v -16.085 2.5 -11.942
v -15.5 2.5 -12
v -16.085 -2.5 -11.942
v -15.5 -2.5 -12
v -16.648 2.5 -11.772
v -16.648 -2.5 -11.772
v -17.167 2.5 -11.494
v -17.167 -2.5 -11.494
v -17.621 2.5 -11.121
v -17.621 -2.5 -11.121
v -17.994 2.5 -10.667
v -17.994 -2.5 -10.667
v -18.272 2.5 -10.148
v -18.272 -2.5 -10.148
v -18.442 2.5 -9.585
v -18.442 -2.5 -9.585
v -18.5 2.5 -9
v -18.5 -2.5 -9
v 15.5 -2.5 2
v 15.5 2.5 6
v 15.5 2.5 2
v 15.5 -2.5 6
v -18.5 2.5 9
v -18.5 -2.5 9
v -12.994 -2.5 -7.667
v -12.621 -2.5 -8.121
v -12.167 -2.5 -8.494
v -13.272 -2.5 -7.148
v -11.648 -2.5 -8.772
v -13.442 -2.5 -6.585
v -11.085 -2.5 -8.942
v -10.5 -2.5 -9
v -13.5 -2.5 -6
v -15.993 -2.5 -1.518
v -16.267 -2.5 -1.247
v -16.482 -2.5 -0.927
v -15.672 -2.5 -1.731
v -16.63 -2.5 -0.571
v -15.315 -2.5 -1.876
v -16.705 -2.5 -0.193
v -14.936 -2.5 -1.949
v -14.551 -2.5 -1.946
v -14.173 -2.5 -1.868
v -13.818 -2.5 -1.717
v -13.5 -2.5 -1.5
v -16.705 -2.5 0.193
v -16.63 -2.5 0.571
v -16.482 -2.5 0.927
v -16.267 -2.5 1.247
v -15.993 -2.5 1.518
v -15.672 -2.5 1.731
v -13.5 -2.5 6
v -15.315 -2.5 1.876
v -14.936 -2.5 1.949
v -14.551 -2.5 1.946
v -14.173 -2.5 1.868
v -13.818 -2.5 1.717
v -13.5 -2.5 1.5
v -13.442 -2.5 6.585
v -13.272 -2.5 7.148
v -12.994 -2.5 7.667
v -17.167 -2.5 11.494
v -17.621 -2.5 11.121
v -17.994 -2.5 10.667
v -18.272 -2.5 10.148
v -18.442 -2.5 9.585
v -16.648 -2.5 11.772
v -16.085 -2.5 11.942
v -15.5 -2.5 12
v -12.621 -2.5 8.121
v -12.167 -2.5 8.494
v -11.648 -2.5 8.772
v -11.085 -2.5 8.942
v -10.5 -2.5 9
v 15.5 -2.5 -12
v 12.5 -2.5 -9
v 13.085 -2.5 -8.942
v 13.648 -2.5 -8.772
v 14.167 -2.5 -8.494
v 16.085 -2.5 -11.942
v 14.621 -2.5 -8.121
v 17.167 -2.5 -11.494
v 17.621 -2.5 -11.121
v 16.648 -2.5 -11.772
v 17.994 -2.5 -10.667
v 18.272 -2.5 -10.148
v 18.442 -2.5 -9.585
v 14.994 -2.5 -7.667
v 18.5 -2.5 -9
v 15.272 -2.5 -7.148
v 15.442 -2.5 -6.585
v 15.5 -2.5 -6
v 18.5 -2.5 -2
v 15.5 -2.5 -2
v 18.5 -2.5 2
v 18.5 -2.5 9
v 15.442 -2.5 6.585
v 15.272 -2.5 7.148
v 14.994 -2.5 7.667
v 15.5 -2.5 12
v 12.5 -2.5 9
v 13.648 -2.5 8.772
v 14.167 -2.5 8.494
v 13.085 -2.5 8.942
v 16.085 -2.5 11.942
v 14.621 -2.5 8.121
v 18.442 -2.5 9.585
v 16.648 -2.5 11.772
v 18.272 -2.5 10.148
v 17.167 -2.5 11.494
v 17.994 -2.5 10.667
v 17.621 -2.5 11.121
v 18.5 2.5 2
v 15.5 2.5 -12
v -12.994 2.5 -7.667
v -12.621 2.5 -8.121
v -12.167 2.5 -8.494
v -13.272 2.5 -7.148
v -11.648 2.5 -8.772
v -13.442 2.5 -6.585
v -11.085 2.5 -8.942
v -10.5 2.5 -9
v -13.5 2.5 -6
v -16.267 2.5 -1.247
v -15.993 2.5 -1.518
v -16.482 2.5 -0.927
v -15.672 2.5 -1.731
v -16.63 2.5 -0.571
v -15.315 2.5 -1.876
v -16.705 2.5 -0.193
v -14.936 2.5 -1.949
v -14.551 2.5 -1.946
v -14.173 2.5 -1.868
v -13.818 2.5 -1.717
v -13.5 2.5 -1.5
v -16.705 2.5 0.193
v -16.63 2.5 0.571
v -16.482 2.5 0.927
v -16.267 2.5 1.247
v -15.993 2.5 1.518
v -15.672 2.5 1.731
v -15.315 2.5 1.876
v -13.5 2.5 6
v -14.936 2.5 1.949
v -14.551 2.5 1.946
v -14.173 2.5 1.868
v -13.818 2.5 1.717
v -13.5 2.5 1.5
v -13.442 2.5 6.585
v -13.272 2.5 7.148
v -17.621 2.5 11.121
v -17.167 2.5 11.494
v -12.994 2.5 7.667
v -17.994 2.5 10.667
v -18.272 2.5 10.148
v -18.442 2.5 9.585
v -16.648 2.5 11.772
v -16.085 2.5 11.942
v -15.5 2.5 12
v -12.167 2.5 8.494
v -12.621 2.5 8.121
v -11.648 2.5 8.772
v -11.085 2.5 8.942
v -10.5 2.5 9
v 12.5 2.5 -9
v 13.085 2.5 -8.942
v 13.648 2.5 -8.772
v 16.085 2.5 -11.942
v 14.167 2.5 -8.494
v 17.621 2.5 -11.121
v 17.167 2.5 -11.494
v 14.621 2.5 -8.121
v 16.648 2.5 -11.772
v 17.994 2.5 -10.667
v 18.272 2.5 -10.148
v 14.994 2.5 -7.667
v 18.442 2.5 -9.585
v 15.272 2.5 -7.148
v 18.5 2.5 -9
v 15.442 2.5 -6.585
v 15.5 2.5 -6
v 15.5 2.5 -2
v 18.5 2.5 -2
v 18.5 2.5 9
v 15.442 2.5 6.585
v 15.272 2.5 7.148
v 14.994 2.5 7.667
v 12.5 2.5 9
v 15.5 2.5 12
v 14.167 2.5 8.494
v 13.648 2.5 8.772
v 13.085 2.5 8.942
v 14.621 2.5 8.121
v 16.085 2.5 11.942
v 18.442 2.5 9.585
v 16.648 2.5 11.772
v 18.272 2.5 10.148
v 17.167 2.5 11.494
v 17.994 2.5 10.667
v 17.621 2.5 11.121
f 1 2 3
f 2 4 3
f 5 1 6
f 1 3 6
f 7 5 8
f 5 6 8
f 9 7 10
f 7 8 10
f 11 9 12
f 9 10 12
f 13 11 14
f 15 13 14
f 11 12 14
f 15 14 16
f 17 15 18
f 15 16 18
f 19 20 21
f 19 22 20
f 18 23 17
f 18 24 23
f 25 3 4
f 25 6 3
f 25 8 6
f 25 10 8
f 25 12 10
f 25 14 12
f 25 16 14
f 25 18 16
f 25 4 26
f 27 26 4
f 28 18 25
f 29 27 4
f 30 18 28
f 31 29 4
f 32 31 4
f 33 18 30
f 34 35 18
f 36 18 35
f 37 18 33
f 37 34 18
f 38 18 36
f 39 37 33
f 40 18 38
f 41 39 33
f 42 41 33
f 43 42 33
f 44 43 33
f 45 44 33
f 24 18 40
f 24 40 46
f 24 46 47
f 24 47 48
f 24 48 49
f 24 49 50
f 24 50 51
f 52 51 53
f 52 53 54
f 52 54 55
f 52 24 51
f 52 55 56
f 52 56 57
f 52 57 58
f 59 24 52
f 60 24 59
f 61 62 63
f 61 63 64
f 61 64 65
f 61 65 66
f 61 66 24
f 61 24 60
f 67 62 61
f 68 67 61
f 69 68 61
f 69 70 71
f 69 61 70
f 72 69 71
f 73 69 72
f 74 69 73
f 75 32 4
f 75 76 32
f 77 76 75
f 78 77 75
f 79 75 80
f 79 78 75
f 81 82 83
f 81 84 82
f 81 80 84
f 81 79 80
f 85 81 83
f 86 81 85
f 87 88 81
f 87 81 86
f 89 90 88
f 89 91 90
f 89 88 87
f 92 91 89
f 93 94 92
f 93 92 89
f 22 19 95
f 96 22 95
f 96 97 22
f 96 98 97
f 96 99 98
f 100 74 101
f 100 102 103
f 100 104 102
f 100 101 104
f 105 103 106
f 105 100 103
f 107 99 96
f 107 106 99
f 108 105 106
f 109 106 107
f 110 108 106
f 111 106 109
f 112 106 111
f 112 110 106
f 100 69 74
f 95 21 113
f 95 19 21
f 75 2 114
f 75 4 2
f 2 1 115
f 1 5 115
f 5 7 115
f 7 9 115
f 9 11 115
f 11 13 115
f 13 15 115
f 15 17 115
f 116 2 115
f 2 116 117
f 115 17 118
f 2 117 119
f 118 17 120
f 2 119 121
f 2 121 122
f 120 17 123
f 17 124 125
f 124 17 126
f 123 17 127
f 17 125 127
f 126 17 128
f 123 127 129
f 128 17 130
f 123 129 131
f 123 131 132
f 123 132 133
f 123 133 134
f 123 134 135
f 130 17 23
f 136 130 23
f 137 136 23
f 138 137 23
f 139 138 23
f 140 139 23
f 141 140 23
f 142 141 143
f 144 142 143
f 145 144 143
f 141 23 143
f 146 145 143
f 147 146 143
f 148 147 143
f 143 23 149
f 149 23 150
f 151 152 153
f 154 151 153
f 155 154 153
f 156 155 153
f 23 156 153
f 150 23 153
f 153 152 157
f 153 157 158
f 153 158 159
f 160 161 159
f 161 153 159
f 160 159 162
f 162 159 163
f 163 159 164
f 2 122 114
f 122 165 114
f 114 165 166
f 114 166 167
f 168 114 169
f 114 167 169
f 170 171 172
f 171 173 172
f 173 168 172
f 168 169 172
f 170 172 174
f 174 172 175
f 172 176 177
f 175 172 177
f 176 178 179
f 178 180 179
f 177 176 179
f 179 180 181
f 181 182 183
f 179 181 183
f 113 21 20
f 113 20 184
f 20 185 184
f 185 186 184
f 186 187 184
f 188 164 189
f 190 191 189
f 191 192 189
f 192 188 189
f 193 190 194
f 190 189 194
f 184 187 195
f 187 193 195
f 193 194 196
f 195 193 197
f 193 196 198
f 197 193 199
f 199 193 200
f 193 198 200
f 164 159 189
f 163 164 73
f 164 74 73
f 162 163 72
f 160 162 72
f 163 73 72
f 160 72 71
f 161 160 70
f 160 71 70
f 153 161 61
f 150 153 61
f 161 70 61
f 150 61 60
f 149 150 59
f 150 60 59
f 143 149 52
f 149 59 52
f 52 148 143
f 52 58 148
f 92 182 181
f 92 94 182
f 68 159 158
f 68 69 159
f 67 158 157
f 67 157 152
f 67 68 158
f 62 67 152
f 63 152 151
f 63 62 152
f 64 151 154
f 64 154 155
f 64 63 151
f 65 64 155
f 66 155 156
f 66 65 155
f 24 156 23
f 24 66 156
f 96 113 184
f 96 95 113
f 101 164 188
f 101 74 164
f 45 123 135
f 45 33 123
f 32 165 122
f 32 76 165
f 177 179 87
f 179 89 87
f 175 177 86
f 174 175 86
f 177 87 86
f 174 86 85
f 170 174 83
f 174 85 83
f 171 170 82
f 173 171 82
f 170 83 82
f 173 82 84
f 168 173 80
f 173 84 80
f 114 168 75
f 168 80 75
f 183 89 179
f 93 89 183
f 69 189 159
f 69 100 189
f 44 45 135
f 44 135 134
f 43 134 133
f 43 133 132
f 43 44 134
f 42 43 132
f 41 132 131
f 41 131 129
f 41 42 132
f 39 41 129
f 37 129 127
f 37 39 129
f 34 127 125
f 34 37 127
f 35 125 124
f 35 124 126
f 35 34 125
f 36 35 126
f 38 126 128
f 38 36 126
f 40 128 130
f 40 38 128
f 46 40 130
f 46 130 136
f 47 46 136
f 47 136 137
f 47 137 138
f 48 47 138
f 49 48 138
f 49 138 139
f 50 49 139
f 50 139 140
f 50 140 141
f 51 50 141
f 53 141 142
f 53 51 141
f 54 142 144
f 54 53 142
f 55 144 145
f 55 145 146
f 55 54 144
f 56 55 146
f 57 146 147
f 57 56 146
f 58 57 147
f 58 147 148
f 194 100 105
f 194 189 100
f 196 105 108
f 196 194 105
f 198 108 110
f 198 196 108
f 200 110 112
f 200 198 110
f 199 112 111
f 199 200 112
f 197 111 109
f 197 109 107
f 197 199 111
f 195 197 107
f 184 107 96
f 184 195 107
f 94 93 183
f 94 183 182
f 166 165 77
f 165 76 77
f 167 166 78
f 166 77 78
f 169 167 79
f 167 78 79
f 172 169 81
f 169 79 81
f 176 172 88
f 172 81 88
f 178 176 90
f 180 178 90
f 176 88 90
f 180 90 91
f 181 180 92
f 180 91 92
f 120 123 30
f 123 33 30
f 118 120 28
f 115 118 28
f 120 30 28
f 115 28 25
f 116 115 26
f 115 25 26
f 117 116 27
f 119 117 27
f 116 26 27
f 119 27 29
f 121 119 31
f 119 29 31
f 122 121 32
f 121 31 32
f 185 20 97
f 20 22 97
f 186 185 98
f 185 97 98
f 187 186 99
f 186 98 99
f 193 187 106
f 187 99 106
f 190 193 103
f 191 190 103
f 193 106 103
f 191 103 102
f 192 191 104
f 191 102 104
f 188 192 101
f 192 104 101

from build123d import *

# Parameters (mm, degrees)
F1_DEPTH = 2.5
F2_R     = 3


with BuildPart() as f1:
    # F0 (on Front) → F1 (new body, symmetric)
    with BuildSketch(Plane.XZ):
        with BuildLine():
            Line((18.5, 12), (-18.5, 12))
            Line((-18.5, 12), (-18.5, -12))
            Line((-18.5, -12), (18.5, -12))
            Line((18.5, -12), (18.5, -2))
            Line((18.5, -2), (15.5, -2))
            Line((15.5, -2), (15.5, -9))
            Line((15.5, -9), (-13.5, -9))
            Line((-13.5, -9), (-13.5, -1.5))
            ThreePointArc((-13.5, -1.5), (-16.714869, 0), (-13.5, 1.5))
            Line((-13.5, 1.5), (-13.5, 9))
            Line((-13.5, 9), (15.5, 9))
            Line((15.5, 9), (15.5, 2))
            Line((15.5, 2), (18.5, 2))
            Line((18.5, 2), (18.5, 12))
        make_face()
    extrude(amount=F1_DEPTH, both=True)

    # F2
    f2_edges = [f1.edges().sort_by_distance(p)[0] for p in [
        (18.5, 0, 12),
        (18.5, 0, -12),
        (-18.5, 0, 12),
        (-18.5, 0, -12),
        (15.5, 0, -9),
        (15.5, 0, 9),
        (-13.5, 0, 9),
        (-13.5, 0, -9),
    ]]
    fillet(f2_edges, radius=F2_R)


solid = f1.part
